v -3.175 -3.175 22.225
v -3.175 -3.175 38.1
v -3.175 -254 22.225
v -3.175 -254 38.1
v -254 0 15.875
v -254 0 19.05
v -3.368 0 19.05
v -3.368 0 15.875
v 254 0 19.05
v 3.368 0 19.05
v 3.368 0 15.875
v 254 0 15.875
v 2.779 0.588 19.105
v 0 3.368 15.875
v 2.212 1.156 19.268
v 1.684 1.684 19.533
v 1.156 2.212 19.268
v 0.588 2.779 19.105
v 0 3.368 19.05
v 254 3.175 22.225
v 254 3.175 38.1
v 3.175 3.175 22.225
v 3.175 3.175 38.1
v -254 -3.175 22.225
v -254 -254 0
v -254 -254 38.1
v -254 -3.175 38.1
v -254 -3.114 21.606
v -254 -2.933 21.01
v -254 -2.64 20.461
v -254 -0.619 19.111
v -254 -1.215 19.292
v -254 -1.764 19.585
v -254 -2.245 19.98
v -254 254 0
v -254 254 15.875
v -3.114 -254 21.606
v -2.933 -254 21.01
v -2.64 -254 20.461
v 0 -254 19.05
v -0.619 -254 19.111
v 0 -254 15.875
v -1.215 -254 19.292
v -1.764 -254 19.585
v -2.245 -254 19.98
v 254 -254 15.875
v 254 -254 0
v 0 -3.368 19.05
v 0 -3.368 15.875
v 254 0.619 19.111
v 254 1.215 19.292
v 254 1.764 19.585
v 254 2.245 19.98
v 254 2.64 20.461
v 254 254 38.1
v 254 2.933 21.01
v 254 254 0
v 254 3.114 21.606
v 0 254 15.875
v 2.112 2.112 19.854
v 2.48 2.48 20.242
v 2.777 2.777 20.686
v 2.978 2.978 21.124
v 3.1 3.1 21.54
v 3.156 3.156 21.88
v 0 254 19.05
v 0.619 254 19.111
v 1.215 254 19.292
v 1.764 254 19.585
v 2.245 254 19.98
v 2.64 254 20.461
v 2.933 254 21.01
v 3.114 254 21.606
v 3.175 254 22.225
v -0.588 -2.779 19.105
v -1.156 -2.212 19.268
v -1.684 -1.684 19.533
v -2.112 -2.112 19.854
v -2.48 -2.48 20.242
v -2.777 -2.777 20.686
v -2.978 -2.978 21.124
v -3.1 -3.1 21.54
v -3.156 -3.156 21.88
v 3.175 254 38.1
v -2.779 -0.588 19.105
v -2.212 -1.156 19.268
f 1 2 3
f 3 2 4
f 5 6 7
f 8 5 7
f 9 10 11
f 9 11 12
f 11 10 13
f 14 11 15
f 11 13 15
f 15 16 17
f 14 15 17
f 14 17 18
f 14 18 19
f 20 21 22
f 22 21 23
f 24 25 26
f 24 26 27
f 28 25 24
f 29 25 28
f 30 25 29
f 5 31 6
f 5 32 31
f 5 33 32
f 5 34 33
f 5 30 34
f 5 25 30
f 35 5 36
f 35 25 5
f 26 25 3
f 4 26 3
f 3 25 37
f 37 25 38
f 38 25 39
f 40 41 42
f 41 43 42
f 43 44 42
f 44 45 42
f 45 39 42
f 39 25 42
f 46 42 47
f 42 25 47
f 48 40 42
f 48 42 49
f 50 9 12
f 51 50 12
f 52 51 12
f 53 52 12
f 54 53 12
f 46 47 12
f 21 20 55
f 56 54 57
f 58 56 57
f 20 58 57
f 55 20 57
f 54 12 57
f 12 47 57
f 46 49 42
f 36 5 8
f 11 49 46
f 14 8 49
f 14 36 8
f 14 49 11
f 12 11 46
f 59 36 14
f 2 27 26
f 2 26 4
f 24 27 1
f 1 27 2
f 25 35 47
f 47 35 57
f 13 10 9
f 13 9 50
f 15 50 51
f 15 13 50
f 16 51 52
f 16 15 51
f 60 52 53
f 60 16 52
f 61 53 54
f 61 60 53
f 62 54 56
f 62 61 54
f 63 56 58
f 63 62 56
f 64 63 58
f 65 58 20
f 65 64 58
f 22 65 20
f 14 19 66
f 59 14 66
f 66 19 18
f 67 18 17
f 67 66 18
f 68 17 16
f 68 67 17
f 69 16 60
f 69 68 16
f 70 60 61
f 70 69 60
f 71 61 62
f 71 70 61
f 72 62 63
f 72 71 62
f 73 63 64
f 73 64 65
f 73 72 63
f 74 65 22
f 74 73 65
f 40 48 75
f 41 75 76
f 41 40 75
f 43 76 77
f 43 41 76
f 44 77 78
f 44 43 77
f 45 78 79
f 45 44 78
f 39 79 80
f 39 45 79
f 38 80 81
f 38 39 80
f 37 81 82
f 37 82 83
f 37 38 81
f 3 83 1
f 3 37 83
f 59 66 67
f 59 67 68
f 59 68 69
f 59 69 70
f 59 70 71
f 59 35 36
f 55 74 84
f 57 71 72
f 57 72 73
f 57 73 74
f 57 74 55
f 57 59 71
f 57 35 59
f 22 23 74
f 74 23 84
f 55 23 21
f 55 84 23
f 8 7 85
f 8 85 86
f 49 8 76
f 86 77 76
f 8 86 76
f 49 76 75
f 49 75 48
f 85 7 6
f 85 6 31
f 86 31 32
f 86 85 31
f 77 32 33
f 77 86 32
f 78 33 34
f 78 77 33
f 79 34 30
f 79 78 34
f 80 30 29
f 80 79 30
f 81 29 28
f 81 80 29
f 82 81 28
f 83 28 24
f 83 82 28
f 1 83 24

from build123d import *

# Parameters (mm, degrees)
F0_W     = 508
F0_H     = 508
F1_DEPTH = 38.1
F2_W     = 250.825
F2_H     = 250.825
F2_H_2   = 6.35
F2_W_2   = 6.35
F3_DEPTH = 19.05
F4_R     = 3.17499
F6_DEPTH = 22.225


# Not quite as in the source:
# - a fillet or chamfer is up to 0.001 mm smaller than in the source, because OpenCascade refuses the exact size
# - a pattern or mirror of a feature is missing from the dataset's text; its kind, count and spacing are read off the source's solid


with BuildPart() as f1:
    # F0 (on Top) → F1 (new body)
    with BuildSketch(Plane.XY):
        Rectangle(F0_W, F0_H)
    extrude(amount=F1_DEPTH)

    # F2 (on face) → F3 (cut)
    with BuildSketch(Plane.XY.offset(38.1)):
        with Locations((128.5875, -128.5875)):
            Rectangle(F2_W, F2_H)
        with Locations((128.5875, 0)):
            Rectangle(F2_W, F2_H_2)
        with Locations((0, -128.5875)):
            Rectangle(F2_W_2, F2_H)
        Rectangle(F2_W_2, F2_H_2)
        with Locations((-128.5875, 0)):
            Rectangle(F2_W, F2_H_2)
        with Locations((0, 128.5875)):
            Rectangle(F2_W_2, F2_H)
    extrude(amount=-F3_DEPTH, mode=Mode.SUBTRACT)

    # F4 (radius 3.175 in the source; OpenCascade refuses exactly that, so slightly less here)
    f4_edges = [f1.edges().sort_by_distance(p)[0] for p in [
        (-128.5875, -3.175, 19.05),
        (-3.175, -128.5875, 19.05),
        (3.175, 128.5875, 19.05),
        (128.5875, 3.175, 19.05),
        (-3.175, 128.5875, 19.05),
        (-128.5875, 3.175, 19.05),
    ]]
    fillet(f4_edges, radius=F4_R)

    # F5 (on face) → F6 (cut)
    with BuildSketch(Plane.XY.offset(38.1)):
        Polygon((0, 254), (-254, 254), (-254, 0), (-3.3675960454, 0), (-1.6837980227, -1.6837980227), (1.6837980227, 1.6837980227), (0, 3.3675960454), align=None)
    f6 = extrude(amount=-F6_DEPTH, mode=Mode.SUBTRACT)

    # F6_copies: F6 across plane
    add(f6.mirror(Plane(origin=(0, 0, 0), x_dir=(-0.7071067812, -0.7071067812, 0), z_dir=(0.7071067812, -0.7071067812, 0))), mode=Mode.SUBTRACT)


solid = f1.part
